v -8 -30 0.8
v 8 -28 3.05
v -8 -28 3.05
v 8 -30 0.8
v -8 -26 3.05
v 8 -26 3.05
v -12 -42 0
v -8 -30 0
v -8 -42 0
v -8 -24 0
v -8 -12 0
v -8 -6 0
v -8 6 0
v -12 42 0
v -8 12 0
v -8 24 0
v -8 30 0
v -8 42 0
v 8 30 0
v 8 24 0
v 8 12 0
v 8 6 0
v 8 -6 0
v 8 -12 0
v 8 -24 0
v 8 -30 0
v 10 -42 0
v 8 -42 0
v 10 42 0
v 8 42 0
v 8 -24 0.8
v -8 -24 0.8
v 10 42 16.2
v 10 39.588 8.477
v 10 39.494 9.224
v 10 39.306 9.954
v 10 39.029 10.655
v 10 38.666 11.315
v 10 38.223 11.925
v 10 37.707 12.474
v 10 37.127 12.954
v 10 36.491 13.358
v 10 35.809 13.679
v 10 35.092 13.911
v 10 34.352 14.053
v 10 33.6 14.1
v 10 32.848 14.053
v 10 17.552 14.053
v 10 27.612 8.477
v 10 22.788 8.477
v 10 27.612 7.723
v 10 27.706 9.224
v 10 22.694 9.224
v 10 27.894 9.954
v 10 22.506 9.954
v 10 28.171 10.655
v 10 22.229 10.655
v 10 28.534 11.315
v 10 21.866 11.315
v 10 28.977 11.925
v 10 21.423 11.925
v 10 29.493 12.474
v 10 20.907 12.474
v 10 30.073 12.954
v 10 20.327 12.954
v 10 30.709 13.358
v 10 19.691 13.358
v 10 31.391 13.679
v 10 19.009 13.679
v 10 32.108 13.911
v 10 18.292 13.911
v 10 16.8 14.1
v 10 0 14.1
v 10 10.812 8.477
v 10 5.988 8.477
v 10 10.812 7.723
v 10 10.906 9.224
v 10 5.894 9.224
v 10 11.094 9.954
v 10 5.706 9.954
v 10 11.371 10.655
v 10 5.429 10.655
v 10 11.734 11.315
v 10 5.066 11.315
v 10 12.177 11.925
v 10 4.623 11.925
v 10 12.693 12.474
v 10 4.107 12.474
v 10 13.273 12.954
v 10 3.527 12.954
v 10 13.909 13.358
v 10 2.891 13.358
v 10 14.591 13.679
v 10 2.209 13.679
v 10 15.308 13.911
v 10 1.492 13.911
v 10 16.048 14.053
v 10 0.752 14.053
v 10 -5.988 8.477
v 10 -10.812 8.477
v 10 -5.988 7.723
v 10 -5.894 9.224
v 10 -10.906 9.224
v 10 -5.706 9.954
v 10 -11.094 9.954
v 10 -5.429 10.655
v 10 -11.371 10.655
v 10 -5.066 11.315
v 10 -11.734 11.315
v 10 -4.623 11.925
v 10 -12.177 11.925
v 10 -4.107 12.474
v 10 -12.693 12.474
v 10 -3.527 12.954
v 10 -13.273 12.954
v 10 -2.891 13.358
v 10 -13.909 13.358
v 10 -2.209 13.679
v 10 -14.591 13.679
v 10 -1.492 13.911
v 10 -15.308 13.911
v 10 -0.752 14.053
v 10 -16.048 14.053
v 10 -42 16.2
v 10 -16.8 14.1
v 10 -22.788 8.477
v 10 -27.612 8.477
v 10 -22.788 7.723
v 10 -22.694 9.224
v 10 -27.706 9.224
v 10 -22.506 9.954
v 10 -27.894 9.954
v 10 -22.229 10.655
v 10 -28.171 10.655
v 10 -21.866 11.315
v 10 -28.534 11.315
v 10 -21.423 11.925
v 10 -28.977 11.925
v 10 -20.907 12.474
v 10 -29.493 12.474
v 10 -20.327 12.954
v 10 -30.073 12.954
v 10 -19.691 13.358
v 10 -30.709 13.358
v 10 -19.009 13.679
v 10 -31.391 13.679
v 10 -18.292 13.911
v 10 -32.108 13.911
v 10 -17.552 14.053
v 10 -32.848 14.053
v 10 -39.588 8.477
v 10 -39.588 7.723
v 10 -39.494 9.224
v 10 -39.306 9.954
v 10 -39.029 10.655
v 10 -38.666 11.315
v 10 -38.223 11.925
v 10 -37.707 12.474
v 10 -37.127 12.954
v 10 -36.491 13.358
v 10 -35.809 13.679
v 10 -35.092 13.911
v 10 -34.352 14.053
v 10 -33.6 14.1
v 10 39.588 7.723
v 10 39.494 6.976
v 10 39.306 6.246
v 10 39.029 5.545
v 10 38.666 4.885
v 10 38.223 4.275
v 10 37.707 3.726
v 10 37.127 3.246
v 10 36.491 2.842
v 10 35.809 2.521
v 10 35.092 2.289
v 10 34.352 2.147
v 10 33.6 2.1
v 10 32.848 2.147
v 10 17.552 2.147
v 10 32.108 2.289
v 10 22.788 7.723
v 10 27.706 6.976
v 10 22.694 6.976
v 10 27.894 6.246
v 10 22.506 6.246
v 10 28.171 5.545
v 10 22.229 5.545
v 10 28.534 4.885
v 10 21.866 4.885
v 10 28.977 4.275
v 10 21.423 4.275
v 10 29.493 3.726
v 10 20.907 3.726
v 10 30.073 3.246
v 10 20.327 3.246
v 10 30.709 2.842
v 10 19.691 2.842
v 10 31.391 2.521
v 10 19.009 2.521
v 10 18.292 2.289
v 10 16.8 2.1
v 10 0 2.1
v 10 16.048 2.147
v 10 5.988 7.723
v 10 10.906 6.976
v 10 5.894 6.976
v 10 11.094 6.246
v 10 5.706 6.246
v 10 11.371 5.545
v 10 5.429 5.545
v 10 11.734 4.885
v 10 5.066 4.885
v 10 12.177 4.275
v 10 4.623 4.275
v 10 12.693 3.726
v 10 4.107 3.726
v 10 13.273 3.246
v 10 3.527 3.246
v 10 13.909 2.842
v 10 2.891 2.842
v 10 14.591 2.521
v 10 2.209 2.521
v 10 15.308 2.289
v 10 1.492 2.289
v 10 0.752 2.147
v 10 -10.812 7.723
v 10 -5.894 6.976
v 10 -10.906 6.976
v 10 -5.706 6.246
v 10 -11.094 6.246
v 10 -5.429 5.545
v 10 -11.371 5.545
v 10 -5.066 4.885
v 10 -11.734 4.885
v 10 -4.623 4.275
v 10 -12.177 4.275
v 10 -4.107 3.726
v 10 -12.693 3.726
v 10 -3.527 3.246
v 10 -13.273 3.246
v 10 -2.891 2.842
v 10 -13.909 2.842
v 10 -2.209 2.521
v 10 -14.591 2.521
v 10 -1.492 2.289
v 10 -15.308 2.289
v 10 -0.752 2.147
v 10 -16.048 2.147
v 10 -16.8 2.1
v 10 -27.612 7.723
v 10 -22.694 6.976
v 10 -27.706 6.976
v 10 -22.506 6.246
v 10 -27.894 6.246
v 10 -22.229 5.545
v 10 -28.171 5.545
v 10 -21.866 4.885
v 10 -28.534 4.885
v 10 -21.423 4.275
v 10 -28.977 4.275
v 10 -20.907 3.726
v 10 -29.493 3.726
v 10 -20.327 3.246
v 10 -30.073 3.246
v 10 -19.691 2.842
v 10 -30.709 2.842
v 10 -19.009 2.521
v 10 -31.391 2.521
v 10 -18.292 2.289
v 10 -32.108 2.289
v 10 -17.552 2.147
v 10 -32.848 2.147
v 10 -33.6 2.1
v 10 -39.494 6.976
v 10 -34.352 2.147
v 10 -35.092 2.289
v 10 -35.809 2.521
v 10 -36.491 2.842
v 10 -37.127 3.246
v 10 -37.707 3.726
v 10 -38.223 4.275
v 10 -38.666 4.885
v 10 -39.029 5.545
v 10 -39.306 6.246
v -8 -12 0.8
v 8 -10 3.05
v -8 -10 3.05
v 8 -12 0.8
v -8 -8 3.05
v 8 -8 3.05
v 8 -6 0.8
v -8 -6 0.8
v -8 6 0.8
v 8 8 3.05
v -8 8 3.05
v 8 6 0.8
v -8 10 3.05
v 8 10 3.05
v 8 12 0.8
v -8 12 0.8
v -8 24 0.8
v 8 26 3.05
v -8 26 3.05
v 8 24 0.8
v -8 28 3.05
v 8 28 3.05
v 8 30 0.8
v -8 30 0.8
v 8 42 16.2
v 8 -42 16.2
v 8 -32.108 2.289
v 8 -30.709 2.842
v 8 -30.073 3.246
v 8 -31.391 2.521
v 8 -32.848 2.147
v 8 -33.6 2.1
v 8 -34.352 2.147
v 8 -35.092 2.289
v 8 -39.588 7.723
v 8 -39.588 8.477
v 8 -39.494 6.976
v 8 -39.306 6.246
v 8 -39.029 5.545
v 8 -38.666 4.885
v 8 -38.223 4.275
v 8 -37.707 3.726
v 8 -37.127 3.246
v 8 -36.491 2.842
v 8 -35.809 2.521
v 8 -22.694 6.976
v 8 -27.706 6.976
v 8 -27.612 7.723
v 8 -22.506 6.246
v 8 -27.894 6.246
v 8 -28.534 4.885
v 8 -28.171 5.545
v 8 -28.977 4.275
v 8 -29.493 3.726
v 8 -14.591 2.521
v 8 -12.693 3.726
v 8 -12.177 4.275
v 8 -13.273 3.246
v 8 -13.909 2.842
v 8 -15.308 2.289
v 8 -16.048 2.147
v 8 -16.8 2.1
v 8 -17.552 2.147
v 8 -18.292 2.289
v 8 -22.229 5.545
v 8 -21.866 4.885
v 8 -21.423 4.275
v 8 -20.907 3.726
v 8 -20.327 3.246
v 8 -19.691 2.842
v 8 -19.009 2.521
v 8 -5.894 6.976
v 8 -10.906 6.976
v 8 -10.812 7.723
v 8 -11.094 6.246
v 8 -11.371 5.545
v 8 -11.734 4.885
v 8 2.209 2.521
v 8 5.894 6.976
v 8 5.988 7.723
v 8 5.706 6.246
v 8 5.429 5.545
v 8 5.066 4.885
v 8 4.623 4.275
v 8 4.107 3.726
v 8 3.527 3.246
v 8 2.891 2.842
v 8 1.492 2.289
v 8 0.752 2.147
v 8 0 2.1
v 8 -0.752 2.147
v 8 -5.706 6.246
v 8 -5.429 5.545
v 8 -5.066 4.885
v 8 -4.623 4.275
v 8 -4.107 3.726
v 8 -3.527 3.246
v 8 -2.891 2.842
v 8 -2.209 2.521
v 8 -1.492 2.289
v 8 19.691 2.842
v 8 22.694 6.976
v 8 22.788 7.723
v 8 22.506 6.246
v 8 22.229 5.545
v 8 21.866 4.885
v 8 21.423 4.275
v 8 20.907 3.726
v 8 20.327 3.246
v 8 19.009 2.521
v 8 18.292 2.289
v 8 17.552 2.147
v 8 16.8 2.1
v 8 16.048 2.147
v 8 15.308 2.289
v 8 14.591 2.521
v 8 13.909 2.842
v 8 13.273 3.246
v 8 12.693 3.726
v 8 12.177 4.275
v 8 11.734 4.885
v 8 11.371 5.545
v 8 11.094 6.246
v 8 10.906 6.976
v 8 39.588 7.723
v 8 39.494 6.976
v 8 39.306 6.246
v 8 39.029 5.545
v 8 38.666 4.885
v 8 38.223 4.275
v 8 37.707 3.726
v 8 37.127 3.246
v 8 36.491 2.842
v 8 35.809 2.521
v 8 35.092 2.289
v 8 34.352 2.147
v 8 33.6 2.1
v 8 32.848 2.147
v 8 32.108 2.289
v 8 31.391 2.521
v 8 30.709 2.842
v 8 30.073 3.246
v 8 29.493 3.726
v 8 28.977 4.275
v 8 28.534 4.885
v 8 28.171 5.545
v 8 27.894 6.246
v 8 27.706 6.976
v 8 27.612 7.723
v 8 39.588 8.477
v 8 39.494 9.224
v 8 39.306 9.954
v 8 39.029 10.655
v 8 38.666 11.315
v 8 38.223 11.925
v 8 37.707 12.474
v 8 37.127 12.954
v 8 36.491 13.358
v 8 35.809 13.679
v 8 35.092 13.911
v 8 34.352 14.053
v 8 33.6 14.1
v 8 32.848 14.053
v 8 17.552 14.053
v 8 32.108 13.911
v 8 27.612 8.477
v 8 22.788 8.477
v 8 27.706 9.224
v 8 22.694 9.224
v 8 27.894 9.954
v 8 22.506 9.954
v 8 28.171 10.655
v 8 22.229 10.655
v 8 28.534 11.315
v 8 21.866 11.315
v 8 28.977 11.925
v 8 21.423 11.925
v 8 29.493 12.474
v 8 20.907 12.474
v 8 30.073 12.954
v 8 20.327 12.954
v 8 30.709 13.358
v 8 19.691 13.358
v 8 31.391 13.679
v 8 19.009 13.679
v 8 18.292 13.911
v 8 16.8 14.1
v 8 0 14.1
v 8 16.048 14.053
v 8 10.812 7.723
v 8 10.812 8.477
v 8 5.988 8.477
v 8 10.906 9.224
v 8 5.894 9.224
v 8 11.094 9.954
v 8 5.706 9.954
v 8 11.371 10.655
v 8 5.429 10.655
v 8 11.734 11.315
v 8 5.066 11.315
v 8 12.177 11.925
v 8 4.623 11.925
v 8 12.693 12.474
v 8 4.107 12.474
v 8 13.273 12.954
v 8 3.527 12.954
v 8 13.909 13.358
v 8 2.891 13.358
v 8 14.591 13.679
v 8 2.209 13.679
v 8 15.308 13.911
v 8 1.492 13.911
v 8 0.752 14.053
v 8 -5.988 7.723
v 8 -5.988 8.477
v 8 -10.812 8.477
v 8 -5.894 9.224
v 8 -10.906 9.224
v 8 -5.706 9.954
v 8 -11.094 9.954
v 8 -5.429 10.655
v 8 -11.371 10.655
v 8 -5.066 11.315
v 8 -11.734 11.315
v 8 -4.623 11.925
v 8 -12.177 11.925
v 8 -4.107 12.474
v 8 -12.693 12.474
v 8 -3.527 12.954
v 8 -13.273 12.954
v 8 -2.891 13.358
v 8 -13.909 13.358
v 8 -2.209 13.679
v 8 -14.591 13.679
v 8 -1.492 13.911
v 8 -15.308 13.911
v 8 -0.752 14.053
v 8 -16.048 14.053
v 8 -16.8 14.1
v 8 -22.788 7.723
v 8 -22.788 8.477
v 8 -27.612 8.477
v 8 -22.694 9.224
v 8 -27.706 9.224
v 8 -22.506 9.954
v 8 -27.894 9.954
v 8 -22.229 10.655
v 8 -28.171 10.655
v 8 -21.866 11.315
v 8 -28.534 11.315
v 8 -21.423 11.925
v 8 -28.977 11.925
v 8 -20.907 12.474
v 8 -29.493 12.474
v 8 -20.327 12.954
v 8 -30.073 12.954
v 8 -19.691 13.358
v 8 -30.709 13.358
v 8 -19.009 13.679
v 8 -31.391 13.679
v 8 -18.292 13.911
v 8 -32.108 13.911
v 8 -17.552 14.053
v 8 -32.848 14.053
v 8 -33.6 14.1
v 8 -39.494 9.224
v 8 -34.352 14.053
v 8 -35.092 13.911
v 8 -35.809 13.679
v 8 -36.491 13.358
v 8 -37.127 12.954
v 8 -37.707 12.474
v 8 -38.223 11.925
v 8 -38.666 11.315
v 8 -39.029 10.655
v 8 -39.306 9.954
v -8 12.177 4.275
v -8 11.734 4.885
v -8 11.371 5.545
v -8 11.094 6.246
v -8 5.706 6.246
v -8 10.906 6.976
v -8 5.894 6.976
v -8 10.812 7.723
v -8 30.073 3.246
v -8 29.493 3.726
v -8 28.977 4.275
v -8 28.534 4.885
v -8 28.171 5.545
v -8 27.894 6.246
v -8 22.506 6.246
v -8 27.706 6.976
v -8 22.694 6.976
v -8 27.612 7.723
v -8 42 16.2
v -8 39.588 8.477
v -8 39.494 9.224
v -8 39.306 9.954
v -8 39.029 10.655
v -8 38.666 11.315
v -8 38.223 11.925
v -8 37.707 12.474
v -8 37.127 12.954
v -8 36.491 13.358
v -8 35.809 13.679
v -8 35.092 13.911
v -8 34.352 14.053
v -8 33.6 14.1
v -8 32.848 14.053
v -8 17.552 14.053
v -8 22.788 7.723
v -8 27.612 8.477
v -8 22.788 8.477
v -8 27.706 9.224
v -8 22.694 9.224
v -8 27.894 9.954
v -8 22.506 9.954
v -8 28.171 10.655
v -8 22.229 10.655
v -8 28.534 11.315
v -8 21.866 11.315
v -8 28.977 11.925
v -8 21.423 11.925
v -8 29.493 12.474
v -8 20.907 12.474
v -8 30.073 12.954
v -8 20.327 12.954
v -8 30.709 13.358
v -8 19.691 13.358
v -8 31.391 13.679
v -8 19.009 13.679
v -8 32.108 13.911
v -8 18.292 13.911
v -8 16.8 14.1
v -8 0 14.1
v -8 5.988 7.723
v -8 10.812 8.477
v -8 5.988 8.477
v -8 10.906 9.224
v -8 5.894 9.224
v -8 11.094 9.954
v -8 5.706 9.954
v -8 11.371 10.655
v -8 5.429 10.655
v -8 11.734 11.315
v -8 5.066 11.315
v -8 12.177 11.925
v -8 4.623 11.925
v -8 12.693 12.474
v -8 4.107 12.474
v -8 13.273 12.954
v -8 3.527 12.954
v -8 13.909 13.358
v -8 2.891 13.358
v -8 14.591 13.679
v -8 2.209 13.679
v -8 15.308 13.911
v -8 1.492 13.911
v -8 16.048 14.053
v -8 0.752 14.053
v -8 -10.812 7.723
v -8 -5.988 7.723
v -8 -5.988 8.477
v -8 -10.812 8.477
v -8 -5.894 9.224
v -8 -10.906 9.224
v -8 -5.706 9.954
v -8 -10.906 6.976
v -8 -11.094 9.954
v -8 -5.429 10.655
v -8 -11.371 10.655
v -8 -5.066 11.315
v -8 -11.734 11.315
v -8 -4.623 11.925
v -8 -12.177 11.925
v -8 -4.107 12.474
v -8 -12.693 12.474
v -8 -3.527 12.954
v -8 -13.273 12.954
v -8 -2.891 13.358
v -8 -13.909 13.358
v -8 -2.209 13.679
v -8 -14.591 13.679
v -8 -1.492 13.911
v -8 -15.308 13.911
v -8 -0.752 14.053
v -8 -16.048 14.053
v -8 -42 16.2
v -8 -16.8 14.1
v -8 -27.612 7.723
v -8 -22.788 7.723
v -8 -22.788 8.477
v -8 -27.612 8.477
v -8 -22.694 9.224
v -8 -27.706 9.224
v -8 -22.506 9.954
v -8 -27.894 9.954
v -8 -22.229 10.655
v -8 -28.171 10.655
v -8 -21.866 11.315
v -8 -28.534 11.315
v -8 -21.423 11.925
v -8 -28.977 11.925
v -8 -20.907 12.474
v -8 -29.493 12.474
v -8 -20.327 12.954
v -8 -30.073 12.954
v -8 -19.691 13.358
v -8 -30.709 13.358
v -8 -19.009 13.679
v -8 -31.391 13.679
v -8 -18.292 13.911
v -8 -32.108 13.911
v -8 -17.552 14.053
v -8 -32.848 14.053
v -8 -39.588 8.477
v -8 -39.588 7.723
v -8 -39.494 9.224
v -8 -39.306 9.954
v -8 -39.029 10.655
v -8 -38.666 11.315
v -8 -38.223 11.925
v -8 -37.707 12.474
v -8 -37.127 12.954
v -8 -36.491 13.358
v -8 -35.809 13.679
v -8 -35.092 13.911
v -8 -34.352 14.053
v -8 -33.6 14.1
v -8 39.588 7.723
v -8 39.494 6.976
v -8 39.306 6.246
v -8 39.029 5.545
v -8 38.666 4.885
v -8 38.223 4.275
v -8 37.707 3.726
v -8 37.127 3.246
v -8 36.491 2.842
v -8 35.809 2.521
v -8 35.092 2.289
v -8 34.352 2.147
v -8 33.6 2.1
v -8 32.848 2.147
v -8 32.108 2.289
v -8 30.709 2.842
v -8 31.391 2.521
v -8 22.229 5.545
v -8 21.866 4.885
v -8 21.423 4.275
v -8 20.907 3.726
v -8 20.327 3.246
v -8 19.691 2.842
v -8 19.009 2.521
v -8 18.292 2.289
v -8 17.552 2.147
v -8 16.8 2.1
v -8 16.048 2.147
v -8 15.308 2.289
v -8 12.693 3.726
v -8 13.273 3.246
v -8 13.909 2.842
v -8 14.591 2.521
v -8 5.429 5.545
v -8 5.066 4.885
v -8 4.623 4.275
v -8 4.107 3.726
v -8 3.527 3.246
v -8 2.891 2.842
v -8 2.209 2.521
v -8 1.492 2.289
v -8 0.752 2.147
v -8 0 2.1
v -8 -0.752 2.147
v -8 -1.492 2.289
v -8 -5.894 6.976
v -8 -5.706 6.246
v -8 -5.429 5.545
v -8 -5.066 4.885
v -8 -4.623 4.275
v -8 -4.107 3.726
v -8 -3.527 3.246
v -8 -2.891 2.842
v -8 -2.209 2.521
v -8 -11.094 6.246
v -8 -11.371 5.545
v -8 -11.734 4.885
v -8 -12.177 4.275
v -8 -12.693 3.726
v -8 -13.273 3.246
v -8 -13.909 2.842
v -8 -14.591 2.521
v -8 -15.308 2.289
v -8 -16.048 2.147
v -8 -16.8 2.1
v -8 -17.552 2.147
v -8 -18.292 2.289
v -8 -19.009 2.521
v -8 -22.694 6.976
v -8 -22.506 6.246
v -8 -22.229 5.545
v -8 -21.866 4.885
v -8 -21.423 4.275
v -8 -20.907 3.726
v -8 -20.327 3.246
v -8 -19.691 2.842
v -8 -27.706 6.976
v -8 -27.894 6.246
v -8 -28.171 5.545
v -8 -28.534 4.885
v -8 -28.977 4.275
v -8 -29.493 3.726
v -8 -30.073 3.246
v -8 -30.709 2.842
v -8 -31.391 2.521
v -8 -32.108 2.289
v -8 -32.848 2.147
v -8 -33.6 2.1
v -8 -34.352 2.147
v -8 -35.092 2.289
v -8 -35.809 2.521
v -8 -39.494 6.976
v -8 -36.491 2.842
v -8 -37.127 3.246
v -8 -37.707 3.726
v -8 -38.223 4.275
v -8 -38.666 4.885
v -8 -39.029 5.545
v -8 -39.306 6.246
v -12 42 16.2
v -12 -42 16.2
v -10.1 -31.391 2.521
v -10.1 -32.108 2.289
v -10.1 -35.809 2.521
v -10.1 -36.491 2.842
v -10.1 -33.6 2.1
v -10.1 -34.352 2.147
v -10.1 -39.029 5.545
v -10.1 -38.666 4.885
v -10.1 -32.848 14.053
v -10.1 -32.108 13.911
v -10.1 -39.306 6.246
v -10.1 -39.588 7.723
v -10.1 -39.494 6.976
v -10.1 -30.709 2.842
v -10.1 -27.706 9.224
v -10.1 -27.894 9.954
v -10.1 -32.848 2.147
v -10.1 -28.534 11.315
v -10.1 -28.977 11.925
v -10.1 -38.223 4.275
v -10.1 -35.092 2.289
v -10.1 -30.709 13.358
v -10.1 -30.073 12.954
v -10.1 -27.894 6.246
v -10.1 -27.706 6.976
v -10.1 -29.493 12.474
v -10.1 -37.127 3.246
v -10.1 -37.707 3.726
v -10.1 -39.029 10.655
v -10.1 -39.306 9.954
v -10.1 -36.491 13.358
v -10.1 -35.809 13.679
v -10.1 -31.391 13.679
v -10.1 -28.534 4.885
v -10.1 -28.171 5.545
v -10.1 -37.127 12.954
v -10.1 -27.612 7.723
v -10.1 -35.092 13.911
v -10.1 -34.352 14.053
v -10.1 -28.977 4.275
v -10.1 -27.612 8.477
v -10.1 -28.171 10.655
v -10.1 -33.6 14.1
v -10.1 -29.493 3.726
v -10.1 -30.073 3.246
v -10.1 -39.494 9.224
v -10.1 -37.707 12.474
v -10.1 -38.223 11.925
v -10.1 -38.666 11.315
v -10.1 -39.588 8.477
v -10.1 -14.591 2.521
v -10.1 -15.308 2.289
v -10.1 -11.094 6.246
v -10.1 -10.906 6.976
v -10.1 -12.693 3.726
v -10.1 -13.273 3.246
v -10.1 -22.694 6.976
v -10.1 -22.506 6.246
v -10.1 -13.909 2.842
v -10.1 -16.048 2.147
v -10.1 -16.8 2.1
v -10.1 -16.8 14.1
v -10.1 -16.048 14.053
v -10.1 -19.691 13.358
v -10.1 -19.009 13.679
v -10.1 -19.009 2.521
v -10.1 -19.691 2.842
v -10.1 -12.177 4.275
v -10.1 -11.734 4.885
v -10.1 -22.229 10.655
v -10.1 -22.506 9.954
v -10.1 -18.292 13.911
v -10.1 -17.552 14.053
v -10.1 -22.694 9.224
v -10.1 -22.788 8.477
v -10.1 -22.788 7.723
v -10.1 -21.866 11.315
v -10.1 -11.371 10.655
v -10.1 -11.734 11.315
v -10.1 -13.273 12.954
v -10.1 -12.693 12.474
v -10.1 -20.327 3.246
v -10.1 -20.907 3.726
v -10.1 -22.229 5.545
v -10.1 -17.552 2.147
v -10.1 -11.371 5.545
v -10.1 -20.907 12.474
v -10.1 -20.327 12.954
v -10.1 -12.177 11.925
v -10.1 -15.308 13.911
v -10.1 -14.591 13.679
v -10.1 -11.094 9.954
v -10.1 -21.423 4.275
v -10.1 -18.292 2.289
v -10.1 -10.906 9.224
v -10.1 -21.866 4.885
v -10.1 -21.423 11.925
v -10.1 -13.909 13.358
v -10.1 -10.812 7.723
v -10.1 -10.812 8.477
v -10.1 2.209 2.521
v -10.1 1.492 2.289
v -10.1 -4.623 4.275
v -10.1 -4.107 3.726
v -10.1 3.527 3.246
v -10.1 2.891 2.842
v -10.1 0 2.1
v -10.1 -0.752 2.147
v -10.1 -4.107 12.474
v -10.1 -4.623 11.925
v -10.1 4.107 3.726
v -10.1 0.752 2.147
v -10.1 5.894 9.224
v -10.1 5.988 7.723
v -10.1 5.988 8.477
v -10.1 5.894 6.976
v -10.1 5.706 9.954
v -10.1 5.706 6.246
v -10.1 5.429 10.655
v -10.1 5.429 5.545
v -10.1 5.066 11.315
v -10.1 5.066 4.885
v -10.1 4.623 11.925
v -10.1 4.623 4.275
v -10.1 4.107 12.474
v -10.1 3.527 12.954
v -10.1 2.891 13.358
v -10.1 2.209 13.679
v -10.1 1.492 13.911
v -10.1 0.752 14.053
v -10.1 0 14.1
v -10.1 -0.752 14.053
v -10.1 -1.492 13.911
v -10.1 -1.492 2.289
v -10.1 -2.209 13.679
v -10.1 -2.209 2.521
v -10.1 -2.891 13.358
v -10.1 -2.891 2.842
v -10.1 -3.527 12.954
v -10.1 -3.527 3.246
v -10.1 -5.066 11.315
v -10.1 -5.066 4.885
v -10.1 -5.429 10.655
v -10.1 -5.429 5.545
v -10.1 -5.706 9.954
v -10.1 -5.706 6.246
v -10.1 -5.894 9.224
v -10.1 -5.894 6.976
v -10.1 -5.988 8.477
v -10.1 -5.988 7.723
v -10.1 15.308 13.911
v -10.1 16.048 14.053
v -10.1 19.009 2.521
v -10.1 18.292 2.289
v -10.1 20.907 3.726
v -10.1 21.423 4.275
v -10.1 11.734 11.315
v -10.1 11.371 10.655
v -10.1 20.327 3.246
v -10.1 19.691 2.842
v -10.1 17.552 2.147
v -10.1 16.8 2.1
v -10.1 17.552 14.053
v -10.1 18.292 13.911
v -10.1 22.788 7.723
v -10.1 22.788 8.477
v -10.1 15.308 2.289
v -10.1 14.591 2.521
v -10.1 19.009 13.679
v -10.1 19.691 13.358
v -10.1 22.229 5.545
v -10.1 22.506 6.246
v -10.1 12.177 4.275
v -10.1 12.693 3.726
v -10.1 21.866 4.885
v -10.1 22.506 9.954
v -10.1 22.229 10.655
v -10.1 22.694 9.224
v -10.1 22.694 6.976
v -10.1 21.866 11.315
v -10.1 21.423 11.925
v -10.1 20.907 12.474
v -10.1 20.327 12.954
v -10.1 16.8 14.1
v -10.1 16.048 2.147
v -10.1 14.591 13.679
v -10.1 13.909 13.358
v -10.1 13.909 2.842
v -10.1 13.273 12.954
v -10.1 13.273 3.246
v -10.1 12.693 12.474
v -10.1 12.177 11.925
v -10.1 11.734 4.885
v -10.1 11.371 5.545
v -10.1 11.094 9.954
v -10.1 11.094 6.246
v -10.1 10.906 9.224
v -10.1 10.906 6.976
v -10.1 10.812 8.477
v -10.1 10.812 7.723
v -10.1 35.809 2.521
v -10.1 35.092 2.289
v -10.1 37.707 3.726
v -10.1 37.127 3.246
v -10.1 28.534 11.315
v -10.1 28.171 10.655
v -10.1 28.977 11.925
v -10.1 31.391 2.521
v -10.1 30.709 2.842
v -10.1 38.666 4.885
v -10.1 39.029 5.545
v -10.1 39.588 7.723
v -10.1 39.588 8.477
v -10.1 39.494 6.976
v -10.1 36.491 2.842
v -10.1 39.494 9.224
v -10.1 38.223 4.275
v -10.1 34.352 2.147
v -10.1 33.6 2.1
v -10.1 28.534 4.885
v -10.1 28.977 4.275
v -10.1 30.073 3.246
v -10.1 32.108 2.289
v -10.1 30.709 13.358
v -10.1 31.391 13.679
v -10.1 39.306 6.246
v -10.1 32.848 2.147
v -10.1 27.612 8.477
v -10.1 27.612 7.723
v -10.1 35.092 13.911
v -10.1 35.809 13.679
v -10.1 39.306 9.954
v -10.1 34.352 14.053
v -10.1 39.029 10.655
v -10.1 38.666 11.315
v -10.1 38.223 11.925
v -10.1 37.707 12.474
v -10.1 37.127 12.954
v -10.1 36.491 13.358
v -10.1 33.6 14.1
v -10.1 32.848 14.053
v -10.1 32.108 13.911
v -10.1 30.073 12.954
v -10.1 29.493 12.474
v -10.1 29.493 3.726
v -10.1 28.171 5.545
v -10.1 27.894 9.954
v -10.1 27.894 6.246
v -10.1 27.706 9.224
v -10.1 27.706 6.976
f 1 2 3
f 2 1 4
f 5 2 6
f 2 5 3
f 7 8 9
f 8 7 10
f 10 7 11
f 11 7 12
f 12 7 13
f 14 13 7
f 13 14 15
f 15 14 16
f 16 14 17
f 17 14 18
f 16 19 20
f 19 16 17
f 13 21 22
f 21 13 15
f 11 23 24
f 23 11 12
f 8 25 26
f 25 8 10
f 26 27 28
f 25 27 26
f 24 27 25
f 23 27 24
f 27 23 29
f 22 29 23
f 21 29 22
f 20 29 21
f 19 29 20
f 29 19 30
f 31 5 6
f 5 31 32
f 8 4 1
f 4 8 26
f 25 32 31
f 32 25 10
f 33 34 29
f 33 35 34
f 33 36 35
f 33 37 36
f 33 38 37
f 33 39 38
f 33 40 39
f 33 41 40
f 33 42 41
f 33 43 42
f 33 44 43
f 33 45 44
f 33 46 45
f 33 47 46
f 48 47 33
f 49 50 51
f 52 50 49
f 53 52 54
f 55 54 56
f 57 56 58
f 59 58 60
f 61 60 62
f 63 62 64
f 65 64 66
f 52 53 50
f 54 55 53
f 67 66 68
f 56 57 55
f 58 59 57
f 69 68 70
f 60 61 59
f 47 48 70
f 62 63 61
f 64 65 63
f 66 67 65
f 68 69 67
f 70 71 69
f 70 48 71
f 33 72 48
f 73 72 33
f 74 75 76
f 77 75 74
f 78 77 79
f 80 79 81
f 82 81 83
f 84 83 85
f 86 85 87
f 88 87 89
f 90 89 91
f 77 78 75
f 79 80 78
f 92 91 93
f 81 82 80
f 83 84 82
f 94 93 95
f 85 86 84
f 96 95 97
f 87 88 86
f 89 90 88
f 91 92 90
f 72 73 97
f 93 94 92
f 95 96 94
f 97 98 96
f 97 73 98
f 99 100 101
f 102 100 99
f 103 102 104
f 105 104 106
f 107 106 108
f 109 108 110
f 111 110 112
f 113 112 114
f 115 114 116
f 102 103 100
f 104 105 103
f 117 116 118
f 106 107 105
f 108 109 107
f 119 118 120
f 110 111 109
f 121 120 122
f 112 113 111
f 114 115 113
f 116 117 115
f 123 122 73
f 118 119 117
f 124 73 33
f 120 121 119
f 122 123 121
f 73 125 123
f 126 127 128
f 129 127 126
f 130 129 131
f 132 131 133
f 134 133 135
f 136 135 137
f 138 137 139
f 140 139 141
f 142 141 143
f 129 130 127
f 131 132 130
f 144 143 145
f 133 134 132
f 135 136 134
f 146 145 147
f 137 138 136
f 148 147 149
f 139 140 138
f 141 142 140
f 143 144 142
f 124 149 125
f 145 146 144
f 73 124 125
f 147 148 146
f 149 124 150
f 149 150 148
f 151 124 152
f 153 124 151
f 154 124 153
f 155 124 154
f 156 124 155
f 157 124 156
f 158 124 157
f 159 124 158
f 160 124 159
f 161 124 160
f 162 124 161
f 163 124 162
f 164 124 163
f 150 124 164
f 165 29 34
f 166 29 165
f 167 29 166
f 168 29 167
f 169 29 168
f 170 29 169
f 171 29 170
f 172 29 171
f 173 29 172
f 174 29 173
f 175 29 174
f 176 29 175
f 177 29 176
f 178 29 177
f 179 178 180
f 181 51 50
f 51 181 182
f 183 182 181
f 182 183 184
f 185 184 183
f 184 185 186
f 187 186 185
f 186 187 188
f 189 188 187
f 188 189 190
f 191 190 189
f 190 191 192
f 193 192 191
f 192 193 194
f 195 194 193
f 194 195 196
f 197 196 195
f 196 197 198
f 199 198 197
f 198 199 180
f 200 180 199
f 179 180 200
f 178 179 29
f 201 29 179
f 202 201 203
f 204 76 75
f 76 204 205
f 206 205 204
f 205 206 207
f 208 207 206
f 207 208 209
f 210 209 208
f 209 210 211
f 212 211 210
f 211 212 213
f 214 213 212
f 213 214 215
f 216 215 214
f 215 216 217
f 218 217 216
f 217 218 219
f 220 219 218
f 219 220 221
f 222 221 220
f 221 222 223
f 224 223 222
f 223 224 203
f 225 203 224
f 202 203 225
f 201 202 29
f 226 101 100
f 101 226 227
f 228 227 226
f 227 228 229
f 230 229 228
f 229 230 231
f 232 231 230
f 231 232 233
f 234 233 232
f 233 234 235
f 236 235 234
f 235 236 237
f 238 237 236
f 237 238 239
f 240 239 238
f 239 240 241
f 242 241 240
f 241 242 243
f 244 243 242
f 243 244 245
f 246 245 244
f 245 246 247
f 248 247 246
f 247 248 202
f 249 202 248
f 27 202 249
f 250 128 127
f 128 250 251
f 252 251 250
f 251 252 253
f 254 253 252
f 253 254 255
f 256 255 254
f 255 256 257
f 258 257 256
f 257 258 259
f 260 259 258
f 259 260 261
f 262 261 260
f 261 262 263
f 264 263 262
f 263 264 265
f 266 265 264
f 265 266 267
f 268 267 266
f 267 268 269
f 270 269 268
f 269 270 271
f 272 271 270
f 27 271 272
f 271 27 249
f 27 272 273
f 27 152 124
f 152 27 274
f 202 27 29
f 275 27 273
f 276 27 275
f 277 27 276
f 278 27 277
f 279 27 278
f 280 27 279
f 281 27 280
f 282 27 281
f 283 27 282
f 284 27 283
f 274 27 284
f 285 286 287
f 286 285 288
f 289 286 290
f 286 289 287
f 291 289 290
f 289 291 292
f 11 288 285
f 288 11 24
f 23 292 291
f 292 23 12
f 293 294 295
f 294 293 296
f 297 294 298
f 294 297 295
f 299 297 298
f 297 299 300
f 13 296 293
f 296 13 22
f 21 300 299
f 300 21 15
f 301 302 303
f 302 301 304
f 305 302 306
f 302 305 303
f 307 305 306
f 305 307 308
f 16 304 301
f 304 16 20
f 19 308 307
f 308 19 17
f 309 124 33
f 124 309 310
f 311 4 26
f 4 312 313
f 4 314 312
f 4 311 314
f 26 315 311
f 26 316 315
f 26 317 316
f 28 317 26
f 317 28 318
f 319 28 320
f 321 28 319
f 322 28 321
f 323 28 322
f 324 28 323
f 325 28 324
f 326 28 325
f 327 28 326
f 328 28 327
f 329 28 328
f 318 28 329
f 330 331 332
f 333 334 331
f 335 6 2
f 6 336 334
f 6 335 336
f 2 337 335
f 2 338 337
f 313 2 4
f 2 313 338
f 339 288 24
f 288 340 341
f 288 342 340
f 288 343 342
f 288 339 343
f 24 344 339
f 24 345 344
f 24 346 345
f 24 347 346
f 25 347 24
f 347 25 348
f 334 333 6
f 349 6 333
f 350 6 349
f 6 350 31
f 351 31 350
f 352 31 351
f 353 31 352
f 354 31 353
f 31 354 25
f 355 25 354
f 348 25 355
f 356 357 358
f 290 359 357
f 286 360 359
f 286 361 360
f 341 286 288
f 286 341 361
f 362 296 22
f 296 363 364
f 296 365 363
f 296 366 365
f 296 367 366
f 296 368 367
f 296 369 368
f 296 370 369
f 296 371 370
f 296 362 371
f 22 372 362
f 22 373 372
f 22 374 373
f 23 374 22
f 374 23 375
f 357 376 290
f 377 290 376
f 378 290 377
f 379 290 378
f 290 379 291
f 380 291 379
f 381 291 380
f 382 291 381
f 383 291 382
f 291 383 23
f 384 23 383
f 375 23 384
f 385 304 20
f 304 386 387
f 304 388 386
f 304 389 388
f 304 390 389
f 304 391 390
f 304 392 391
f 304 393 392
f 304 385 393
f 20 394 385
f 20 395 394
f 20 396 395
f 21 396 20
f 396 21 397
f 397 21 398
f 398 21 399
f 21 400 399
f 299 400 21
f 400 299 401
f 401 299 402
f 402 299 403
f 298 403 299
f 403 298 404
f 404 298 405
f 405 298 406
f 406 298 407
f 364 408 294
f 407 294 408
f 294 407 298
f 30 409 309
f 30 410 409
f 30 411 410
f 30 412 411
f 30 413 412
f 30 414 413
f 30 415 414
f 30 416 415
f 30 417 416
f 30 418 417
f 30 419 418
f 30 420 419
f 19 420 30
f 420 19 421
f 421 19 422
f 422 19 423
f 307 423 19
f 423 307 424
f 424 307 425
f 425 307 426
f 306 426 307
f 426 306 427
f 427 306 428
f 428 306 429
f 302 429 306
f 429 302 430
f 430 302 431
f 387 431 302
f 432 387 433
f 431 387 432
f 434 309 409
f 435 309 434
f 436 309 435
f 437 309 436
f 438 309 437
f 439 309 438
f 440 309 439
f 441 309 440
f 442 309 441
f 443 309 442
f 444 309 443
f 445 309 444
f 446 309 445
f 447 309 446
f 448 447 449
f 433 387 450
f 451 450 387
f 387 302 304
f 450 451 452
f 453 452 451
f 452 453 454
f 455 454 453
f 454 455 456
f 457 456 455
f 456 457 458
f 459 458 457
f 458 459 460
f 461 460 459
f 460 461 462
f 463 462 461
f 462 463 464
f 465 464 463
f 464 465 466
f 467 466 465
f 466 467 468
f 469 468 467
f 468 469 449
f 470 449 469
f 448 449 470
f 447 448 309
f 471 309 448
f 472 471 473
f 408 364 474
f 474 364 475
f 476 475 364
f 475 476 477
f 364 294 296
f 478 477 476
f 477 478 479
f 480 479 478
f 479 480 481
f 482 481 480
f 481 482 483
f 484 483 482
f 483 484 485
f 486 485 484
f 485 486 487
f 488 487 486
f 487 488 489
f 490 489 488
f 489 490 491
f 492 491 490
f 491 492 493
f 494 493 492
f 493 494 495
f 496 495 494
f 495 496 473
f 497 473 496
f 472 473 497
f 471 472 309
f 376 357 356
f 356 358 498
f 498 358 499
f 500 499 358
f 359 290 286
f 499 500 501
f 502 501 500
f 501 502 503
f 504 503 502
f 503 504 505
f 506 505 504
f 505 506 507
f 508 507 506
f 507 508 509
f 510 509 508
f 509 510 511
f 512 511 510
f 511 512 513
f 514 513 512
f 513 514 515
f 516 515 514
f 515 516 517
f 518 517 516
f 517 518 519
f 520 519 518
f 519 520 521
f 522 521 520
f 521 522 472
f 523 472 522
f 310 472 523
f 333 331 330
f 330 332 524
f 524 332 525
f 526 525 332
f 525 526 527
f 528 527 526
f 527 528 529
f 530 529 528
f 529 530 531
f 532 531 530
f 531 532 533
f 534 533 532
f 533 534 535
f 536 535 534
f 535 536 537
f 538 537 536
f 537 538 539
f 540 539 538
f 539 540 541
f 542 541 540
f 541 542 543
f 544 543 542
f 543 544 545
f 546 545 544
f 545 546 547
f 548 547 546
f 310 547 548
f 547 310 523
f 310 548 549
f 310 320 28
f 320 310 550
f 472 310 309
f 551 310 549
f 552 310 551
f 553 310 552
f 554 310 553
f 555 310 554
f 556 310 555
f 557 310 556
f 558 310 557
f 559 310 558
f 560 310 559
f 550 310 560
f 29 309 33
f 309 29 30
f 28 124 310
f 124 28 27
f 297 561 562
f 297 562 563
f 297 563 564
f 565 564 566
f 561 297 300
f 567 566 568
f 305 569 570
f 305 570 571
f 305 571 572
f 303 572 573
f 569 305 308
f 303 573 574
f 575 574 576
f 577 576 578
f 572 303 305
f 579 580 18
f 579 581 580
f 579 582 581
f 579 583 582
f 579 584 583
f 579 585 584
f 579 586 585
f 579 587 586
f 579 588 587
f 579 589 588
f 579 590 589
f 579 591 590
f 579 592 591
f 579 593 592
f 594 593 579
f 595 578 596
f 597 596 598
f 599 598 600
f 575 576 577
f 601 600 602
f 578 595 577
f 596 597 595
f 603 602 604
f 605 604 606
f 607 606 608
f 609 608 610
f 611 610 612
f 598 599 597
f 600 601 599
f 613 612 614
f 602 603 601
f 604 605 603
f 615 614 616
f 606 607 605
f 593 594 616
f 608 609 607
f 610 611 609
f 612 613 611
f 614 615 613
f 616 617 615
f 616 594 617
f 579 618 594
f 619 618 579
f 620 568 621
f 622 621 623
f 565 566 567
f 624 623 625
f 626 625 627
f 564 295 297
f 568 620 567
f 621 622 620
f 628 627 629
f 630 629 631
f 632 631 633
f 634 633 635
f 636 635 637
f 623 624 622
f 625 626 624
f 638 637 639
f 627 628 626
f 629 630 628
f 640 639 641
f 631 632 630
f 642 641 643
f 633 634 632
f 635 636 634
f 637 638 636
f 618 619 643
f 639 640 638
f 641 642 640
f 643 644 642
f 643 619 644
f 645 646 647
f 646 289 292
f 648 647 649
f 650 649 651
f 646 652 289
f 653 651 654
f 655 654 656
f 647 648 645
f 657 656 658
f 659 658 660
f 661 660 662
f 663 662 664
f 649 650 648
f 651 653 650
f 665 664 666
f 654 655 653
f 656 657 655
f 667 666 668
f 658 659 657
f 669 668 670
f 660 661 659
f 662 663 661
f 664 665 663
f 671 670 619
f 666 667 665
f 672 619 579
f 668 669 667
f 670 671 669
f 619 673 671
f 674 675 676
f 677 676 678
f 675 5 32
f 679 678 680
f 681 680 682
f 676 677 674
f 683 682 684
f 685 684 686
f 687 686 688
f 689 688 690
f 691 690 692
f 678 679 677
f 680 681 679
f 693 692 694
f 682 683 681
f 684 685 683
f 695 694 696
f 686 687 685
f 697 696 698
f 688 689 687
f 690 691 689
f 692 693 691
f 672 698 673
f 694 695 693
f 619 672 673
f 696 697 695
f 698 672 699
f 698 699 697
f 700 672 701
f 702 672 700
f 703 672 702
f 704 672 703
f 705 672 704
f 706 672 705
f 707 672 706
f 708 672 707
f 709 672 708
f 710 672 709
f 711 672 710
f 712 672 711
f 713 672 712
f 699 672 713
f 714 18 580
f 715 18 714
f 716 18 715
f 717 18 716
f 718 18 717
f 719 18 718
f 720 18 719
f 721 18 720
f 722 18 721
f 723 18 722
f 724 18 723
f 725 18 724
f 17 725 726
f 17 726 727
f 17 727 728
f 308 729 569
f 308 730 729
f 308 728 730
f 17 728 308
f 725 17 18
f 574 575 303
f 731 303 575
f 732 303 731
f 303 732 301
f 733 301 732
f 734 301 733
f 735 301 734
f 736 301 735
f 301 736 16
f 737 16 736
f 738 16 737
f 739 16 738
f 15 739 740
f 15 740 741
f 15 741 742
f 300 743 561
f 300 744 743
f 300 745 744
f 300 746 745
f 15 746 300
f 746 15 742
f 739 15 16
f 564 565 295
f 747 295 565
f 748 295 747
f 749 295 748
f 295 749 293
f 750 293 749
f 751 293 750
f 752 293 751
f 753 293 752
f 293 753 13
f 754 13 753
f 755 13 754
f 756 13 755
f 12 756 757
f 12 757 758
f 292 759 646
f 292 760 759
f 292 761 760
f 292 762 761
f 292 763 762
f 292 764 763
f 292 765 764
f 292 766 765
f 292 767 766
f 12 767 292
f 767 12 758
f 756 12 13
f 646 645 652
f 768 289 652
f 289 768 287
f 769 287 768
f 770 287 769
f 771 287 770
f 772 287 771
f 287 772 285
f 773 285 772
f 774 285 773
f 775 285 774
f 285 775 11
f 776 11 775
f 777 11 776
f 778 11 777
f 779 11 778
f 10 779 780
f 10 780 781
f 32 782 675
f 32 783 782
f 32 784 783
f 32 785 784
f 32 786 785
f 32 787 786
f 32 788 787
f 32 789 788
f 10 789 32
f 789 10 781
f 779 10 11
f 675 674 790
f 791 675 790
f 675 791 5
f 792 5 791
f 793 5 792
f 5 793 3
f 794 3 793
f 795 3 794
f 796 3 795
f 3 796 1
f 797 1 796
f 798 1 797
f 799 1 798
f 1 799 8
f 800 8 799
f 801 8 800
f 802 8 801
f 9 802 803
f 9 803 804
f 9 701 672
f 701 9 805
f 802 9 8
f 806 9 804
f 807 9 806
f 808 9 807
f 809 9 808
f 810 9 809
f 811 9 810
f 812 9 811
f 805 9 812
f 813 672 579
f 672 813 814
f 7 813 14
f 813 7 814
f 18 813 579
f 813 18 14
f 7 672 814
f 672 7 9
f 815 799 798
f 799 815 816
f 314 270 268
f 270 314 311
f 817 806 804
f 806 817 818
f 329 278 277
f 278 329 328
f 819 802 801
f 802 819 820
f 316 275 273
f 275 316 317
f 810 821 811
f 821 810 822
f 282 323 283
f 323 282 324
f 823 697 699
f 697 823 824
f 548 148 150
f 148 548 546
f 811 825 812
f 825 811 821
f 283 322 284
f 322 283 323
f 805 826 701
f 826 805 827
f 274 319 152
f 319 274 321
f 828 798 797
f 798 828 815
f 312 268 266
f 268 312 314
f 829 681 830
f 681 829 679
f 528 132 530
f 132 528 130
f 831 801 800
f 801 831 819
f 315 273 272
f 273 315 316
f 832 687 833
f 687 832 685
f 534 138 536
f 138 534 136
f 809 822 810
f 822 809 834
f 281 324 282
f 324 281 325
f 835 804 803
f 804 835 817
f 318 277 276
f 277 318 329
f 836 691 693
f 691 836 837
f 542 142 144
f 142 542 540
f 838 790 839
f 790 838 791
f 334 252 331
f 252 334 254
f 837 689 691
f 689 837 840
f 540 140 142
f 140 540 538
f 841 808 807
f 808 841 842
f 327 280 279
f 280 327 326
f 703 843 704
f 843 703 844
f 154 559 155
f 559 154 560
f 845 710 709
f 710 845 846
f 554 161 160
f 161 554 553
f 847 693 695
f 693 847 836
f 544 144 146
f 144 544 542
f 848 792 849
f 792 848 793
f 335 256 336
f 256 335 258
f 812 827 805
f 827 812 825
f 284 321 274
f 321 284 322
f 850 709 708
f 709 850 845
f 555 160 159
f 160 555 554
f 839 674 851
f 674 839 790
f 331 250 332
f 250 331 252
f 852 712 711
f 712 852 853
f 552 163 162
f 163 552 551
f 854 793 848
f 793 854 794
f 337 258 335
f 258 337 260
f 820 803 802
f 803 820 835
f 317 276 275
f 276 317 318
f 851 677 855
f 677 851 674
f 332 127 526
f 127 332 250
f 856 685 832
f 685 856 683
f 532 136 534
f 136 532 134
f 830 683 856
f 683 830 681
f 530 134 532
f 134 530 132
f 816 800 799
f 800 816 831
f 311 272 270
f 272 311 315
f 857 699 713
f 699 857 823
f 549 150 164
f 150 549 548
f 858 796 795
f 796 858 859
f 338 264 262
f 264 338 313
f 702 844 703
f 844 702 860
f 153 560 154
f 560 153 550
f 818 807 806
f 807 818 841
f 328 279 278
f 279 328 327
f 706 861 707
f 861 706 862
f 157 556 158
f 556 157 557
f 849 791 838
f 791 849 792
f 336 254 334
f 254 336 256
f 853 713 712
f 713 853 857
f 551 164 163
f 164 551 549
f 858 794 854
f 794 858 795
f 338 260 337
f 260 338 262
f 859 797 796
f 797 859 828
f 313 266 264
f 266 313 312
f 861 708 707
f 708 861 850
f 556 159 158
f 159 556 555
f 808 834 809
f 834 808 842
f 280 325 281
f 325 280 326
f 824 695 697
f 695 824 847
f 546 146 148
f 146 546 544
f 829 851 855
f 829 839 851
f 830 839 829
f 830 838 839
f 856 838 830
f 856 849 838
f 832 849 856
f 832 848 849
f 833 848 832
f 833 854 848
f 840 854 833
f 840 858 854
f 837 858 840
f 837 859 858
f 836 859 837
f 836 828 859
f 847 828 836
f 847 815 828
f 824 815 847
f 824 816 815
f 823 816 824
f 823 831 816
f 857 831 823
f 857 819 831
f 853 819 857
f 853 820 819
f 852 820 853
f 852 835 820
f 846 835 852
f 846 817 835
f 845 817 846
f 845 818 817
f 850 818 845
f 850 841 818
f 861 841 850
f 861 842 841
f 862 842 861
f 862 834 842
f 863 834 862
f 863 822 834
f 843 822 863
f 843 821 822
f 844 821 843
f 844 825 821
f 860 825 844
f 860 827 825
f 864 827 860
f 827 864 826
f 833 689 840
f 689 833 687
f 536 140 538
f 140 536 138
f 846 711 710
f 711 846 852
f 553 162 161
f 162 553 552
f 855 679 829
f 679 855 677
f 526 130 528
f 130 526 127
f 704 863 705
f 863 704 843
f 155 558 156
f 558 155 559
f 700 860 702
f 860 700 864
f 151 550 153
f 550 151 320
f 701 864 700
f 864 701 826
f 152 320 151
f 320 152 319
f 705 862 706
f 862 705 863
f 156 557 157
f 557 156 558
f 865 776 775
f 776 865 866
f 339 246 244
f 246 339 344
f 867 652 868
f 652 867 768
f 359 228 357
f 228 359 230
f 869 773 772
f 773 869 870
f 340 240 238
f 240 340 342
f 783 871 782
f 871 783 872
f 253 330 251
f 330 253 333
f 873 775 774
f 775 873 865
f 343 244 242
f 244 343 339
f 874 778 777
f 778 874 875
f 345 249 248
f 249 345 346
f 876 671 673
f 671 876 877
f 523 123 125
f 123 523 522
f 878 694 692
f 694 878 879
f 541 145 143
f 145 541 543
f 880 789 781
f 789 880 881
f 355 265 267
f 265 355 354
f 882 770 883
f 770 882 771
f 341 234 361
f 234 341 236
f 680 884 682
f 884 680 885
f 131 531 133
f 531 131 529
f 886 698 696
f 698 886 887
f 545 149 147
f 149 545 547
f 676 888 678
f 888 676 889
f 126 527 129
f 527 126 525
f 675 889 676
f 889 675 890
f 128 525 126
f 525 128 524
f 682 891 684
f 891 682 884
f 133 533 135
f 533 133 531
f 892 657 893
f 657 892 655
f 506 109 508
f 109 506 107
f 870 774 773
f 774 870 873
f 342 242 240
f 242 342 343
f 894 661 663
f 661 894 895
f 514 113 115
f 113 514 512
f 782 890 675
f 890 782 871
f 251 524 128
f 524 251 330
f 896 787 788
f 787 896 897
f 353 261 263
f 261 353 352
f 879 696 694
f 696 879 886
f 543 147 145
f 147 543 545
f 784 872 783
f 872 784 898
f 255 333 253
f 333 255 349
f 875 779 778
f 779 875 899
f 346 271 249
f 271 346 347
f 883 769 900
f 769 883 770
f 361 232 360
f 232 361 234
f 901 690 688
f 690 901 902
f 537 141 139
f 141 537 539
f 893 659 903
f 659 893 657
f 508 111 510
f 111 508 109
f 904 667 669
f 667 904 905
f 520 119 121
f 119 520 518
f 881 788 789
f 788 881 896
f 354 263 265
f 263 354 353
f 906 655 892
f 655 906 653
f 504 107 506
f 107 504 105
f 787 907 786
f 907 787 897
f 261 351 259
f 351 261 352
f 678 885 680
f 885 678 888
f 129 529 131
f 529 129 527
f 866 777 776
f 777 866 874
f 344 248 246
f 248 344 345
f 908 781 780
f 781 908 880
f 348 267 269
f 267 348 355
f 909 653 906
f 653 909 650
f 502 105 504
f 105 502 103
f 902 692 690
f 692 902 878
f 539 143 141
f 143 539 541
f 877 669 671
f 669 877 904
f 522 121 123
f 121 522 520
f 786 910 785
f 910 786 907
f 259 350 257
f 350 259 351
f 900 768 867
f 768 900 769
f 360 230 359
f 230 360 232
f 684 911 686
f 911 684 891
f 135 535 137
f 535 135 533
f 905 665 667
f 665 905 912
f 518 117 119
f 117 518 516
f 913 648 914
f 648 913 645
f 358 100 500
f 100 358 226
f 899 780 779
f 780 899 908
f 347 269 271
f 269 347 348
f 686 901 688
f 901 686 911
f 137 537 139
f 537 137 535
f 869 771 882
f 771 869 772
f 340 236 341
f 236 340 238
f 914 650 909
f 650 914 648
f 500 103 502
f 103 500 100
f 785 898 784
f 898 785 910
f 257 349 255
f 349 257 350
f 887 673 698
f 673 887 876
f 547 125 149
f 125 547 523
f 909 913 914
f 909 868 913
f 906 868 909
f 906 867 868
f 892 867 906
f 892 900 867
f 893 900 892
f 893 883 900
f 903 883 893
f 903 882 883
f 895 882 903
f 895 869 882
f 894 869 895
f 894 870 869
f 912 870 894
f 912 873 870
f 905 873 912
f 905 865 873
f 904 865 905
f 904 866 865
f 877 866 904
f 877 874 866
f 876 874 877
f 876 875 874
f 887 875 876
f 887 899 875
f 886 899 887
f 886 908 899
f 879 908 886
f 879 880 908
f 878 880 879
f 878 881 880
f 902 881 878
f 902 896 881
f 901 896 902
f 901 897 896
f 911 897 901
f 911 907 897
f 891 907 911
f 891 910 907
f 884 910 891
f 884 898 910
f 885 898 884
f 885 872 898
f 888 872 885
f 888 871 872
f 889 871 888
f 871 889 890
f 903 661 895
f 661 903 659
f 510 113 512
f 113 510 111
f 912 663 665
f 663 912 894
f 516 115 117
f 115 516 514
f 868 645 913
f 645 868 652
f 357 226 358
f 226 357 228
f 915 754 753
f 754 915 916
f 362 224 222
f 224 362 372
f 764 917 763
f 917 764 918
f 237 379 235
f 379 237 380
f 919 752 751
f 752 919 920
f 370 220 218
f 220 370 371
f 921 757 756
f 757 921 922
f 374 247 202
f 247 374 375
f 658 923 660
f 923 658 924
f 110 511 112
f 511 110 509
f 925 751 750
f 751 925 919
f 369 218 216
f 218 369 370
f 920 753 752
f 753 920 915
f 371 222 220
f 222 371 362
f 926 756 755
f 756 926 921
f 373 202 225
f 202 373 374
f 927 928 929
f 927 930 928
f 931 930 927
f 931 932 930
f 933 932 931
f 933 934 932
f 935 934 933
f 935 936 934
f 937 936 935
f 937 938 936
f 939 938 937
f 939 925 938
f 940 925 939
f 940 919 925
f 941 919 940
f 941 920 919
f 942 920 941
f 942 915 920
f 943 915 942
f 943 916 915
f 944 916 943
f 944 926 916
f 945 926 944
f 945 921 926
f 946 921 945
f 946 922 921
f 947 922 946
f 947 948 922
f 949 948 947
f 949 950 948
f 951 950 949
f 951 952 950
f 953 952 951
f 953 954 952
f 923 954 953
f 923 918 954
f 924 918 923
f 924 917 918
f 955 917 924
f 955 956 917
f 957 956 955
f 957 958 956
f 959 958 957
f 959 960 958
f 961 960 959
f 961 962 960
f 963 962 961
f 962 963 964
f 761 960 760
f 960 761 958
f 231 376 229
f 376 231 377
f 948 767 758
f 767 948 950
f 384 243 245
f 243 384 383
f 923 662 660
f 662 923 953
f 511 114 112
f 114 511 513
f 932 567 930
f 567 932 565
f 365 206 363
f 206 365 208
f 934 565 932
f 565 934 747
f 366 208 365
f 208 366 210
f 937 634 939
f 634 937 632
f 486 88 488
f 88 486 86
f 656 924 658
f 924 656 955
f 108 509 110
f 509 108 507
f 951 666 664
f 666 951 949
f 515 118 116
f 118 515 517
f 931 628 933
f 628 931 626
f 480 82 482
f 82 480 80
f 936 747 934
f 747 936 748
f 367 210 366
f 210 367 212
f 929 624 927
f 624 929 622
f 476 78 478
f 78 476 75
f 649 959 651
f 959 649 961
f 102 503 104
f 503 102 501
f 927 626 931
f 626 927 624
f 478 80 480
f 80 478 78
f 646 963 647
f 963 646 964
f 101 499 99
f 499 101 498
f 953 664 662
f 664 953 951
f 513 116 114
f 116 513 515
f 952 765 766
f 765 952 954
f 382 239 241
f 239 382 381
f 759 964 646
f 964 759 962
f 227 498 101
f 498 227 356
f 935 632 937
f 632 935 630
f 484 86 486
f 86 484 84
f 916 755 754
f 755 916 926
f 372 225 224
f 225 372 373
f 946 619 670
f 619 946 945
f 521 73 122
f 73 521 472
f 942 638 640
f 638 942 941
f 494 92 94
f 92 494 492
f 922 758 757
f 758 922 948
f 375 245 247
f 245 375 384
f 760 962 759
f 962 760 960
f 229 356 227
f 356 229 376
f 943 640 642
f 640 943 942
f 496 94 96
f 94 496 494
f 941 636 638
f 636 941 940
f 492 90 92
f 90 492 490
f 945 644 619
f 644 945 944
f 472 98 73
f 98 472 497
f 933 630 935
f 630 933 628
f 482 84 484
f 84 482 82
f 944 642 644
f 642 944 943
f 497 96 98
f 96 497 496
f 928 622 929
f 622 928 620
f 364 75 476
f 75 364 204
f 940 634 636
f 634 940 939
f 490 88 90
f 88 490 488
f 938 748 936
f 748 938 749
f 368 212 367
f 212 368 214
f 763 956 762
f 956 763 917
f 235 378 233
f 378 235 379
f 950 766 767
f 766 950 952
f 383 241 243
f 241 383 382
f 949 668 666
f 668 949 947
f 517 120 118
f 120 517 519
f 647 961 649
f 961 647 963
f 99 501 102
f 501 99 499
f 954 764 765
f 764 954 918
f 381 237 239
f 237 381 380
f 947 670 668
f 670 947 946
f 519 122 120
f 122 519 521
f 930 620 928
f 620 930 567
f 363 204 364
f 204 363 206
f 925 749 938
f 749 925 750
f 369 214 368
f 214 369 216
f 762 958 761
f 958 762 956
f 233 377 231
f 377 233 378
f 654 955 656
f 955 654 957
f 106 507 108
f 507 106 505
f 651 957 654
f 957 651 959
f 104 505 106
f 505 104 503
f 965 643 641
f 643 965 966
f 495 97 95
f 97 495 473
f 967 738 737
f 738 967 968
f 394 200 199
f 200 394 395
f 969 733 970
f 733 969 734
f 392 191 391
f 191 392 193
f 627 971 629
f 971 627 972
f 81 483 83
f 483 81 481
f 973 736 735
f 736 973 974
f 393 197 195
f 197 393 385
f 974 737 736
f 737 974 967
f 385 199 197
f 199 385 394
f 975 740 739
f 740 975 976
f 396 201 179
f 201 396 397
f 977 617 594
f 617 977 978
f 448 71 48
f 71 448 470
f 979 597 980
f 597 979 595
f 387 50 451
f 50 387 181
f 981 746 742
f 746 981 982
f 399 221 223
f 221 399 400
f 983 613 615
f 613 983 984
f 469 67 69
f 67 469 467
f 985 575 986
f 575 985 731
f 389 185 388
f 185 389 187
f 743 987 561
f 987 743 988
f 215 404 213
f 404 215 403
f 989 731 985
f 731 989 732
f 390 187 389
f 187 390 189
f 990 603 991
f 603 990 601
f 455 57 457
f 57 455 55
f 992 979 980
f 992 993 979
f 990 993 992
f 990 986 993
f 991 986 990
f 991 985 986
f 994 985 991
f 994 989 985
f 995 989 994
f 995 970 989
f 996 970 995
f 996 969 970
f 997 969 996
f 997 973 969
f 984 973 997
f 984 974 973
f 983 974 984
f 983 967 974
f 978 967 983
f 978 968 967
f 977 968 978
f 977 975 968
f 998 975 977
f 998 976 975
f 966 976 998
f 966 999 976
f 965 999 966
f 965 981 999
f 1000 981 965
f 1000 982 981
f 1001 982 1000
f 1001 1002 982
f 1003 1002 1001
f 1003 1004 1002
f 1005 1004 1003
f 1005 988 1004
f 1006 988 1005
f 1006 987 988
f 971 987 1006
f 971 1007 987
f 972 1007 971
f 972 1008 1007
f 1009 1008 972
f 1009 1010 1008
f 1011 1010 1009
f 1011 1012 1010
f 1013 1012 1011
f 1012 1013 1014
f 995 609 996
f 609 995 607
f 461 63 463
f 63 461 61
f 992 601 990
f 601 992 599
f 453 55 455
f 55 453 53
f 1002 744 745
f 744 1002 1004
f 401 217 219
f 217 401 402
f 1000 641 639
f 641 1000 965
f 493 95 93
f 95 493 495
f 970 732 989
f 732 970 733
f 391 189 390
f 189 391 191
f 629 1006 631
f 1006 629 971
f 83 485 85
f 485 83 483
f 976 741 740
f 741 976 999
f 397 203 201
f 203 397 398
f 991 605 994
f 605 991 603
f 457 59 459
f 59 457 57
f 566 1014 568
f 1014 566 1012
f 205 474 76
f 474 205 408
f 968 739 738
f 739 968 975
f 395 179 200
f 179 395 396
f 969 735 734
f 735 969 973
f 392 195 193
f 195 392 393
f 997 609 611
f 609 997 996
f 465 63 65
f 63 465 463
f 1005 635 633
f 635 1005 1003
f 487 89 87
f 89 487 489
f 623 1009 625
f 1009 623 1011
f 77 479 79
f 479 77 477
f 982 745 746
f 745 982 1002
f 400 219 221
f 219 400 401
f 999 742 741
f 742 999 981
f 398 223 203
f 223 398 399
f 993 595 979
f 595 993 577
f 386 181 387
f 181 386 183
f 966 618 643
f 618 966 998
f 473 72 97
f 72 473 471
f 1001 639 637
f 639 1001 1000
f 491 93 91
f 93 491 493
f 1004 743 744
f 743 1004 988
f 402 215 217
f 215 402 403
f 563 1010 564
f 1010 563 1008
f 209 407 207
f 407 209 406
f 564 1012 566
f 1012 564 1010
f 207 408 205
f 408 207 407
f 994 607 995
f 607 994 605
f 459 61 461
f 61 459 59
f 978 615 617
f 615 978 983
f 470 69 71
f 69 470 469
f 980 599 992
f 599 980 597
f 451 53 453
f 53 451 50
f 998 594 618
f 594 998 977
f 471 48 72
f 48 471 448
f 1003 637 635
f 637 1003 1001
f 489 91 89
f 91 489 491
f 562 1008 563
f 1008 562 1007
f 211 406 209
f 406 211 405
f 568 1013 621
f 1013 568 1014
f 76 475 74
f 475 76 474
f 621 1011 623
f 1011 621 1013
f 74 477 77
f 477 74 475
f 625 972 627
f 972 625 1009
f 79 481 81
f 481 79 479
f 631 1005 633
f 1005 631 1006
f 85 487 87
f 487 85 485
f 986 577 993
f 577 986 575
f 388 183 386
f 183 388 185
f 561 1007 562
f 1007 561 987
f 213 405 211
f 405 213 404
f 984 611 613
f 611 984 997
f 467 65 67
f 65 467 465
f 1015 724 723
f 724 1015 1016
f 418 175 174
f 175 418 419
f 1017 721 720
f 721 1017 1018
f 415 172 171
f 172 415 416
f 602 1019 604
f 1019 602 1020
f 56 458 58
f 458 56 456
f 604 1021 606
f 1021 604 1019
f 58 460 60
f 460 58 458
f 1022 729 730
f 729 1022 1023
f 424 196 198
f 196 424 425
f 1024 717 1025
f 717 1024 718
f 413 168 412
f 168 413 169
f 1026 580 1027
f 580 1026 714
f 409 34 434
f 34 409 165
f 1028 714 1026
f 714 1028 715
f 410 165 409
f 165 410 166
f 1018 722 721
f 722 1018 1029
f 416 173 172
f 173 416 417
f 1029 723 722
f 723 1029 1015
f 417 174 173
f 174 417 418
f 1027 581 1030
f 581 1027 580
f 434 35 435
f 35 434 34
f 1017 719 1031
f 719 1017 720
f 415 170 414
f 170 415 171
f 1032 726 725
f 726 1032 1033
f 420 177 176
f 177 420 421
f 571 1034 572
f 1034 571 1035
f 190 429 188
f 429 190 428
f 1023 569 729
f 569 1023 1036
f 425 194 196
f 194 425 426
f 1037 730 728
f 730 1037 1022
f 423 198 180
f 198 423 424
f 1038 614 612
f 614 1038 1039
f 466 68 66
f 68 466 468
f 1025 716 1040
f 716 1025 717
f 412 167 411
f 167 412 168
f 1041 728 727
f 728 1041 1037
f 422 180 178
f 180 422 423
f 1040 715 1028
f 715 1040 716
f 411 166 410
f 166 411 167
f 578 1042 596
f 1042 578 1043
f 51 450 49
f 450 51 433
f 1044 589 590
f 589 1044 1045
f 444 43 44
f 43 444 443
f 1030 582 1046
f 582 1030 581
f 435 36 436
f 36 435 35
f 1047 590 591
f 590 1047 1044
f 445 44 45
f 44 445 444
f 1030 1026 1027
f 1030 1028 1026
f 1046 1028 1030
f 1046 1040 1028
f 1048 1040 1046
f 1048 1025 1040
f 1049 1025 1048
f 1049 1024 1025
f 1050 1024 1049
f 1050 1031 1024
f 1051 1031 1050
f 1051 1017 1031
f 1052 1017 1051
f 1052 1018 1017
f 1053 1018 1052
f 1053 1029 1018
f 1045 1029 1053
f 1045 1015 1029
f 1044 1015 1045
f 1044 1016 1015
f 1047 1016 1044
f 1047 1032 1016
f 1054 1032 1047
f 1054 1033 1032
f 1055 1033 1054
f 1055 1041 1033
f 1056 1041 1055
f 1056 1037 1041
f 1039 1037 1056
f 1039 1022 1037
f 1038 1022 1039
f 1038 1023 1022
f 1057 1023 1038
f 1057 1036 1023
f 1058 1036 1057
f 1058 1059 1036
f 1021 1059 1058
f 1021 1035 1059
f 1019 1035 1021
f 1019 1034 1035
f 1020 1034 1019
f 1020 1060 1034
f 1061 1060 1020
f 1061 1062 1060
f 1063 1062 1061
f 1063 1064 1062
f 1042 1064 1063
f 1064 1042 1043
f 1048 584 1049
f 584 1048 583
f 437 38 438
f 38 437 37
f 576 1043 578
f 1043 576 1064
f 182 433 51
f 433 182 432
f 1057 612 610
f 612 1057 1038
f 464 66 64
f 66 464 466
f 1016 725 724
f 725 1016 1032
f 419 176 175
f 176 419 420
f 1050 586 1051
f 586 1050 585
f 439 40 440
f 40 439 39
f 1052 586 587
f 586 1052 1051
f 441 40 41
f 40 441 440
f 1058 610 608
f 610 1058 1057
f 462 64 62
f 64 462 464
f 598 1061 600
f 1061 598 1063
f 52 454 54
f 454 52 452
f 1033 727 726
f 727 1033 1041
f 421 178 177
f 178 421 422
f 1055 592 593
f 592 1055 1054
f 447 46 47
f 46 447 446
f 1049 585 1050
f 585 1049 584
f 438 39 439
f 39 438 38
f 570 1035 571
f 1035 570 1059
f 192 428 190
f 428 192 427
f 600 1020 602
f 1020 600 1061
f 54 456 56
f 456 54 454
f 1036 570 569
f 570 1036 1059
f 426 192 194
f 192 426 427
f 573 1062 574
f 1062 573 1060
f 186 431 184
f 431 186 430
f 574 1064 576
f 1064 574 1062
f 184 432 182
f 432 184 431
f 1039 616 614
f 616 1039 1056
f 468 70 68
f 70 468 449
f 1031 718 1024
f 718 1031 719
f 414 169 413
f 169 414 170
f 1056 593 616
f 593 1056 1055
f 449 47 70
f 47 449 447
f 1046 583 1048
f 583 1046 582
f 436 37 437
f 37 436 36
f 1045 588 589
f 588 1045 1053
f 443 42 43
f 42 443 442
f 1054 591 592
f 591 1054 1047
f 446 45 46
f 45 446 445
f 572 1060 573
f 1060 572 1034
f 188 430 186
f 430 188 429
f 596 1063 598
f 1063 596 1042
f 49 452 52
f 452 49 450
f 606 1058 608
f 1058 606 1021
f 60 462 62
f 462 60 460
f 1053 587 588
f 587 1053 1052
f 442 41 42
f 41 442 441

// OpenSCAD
// The vial radius
VialR = 6;

// The height of holder
VialH = 20;

//Number of vials
VialN = 5;

difference(){
    union(){
        // slabs
        translate([VialH/2-1,0,1.35*VialR])cube(size = [2,VialN*2.8*VialR,2.7*VialR], center = true);
        translate([-VialH/2,0,1.35*VialR]) cube(size = [4,VialN*2.8*VialR,2.7*VialR], center = true);
        
        // posts
            for ( i = [-1.5*VialR*(VialN-2) : 3*VialR :1.5*VialR*(VialN-1)] ){
                translate([0,i,0])
                hull(){
                   translate([0,0,0.4])cube(size = [VialH,VialR,0.8], center = true);
                   translate([0,0,0.5*VialR])cube(size = [VialH,VialR/3,0.1], center = true);
                   }; 
            }
    }
   

    // holes
    for ( i = [-1.4*VialR*(VialN-1) : 2.8*VialR :1.5*VialR*VialN ] ){
        translate([0,i,1.35*VialR]) rotate([0,90,0]) cylinder (h = 1.01*VialH, r=VialR, center = true, $fn=50);
    }
}
